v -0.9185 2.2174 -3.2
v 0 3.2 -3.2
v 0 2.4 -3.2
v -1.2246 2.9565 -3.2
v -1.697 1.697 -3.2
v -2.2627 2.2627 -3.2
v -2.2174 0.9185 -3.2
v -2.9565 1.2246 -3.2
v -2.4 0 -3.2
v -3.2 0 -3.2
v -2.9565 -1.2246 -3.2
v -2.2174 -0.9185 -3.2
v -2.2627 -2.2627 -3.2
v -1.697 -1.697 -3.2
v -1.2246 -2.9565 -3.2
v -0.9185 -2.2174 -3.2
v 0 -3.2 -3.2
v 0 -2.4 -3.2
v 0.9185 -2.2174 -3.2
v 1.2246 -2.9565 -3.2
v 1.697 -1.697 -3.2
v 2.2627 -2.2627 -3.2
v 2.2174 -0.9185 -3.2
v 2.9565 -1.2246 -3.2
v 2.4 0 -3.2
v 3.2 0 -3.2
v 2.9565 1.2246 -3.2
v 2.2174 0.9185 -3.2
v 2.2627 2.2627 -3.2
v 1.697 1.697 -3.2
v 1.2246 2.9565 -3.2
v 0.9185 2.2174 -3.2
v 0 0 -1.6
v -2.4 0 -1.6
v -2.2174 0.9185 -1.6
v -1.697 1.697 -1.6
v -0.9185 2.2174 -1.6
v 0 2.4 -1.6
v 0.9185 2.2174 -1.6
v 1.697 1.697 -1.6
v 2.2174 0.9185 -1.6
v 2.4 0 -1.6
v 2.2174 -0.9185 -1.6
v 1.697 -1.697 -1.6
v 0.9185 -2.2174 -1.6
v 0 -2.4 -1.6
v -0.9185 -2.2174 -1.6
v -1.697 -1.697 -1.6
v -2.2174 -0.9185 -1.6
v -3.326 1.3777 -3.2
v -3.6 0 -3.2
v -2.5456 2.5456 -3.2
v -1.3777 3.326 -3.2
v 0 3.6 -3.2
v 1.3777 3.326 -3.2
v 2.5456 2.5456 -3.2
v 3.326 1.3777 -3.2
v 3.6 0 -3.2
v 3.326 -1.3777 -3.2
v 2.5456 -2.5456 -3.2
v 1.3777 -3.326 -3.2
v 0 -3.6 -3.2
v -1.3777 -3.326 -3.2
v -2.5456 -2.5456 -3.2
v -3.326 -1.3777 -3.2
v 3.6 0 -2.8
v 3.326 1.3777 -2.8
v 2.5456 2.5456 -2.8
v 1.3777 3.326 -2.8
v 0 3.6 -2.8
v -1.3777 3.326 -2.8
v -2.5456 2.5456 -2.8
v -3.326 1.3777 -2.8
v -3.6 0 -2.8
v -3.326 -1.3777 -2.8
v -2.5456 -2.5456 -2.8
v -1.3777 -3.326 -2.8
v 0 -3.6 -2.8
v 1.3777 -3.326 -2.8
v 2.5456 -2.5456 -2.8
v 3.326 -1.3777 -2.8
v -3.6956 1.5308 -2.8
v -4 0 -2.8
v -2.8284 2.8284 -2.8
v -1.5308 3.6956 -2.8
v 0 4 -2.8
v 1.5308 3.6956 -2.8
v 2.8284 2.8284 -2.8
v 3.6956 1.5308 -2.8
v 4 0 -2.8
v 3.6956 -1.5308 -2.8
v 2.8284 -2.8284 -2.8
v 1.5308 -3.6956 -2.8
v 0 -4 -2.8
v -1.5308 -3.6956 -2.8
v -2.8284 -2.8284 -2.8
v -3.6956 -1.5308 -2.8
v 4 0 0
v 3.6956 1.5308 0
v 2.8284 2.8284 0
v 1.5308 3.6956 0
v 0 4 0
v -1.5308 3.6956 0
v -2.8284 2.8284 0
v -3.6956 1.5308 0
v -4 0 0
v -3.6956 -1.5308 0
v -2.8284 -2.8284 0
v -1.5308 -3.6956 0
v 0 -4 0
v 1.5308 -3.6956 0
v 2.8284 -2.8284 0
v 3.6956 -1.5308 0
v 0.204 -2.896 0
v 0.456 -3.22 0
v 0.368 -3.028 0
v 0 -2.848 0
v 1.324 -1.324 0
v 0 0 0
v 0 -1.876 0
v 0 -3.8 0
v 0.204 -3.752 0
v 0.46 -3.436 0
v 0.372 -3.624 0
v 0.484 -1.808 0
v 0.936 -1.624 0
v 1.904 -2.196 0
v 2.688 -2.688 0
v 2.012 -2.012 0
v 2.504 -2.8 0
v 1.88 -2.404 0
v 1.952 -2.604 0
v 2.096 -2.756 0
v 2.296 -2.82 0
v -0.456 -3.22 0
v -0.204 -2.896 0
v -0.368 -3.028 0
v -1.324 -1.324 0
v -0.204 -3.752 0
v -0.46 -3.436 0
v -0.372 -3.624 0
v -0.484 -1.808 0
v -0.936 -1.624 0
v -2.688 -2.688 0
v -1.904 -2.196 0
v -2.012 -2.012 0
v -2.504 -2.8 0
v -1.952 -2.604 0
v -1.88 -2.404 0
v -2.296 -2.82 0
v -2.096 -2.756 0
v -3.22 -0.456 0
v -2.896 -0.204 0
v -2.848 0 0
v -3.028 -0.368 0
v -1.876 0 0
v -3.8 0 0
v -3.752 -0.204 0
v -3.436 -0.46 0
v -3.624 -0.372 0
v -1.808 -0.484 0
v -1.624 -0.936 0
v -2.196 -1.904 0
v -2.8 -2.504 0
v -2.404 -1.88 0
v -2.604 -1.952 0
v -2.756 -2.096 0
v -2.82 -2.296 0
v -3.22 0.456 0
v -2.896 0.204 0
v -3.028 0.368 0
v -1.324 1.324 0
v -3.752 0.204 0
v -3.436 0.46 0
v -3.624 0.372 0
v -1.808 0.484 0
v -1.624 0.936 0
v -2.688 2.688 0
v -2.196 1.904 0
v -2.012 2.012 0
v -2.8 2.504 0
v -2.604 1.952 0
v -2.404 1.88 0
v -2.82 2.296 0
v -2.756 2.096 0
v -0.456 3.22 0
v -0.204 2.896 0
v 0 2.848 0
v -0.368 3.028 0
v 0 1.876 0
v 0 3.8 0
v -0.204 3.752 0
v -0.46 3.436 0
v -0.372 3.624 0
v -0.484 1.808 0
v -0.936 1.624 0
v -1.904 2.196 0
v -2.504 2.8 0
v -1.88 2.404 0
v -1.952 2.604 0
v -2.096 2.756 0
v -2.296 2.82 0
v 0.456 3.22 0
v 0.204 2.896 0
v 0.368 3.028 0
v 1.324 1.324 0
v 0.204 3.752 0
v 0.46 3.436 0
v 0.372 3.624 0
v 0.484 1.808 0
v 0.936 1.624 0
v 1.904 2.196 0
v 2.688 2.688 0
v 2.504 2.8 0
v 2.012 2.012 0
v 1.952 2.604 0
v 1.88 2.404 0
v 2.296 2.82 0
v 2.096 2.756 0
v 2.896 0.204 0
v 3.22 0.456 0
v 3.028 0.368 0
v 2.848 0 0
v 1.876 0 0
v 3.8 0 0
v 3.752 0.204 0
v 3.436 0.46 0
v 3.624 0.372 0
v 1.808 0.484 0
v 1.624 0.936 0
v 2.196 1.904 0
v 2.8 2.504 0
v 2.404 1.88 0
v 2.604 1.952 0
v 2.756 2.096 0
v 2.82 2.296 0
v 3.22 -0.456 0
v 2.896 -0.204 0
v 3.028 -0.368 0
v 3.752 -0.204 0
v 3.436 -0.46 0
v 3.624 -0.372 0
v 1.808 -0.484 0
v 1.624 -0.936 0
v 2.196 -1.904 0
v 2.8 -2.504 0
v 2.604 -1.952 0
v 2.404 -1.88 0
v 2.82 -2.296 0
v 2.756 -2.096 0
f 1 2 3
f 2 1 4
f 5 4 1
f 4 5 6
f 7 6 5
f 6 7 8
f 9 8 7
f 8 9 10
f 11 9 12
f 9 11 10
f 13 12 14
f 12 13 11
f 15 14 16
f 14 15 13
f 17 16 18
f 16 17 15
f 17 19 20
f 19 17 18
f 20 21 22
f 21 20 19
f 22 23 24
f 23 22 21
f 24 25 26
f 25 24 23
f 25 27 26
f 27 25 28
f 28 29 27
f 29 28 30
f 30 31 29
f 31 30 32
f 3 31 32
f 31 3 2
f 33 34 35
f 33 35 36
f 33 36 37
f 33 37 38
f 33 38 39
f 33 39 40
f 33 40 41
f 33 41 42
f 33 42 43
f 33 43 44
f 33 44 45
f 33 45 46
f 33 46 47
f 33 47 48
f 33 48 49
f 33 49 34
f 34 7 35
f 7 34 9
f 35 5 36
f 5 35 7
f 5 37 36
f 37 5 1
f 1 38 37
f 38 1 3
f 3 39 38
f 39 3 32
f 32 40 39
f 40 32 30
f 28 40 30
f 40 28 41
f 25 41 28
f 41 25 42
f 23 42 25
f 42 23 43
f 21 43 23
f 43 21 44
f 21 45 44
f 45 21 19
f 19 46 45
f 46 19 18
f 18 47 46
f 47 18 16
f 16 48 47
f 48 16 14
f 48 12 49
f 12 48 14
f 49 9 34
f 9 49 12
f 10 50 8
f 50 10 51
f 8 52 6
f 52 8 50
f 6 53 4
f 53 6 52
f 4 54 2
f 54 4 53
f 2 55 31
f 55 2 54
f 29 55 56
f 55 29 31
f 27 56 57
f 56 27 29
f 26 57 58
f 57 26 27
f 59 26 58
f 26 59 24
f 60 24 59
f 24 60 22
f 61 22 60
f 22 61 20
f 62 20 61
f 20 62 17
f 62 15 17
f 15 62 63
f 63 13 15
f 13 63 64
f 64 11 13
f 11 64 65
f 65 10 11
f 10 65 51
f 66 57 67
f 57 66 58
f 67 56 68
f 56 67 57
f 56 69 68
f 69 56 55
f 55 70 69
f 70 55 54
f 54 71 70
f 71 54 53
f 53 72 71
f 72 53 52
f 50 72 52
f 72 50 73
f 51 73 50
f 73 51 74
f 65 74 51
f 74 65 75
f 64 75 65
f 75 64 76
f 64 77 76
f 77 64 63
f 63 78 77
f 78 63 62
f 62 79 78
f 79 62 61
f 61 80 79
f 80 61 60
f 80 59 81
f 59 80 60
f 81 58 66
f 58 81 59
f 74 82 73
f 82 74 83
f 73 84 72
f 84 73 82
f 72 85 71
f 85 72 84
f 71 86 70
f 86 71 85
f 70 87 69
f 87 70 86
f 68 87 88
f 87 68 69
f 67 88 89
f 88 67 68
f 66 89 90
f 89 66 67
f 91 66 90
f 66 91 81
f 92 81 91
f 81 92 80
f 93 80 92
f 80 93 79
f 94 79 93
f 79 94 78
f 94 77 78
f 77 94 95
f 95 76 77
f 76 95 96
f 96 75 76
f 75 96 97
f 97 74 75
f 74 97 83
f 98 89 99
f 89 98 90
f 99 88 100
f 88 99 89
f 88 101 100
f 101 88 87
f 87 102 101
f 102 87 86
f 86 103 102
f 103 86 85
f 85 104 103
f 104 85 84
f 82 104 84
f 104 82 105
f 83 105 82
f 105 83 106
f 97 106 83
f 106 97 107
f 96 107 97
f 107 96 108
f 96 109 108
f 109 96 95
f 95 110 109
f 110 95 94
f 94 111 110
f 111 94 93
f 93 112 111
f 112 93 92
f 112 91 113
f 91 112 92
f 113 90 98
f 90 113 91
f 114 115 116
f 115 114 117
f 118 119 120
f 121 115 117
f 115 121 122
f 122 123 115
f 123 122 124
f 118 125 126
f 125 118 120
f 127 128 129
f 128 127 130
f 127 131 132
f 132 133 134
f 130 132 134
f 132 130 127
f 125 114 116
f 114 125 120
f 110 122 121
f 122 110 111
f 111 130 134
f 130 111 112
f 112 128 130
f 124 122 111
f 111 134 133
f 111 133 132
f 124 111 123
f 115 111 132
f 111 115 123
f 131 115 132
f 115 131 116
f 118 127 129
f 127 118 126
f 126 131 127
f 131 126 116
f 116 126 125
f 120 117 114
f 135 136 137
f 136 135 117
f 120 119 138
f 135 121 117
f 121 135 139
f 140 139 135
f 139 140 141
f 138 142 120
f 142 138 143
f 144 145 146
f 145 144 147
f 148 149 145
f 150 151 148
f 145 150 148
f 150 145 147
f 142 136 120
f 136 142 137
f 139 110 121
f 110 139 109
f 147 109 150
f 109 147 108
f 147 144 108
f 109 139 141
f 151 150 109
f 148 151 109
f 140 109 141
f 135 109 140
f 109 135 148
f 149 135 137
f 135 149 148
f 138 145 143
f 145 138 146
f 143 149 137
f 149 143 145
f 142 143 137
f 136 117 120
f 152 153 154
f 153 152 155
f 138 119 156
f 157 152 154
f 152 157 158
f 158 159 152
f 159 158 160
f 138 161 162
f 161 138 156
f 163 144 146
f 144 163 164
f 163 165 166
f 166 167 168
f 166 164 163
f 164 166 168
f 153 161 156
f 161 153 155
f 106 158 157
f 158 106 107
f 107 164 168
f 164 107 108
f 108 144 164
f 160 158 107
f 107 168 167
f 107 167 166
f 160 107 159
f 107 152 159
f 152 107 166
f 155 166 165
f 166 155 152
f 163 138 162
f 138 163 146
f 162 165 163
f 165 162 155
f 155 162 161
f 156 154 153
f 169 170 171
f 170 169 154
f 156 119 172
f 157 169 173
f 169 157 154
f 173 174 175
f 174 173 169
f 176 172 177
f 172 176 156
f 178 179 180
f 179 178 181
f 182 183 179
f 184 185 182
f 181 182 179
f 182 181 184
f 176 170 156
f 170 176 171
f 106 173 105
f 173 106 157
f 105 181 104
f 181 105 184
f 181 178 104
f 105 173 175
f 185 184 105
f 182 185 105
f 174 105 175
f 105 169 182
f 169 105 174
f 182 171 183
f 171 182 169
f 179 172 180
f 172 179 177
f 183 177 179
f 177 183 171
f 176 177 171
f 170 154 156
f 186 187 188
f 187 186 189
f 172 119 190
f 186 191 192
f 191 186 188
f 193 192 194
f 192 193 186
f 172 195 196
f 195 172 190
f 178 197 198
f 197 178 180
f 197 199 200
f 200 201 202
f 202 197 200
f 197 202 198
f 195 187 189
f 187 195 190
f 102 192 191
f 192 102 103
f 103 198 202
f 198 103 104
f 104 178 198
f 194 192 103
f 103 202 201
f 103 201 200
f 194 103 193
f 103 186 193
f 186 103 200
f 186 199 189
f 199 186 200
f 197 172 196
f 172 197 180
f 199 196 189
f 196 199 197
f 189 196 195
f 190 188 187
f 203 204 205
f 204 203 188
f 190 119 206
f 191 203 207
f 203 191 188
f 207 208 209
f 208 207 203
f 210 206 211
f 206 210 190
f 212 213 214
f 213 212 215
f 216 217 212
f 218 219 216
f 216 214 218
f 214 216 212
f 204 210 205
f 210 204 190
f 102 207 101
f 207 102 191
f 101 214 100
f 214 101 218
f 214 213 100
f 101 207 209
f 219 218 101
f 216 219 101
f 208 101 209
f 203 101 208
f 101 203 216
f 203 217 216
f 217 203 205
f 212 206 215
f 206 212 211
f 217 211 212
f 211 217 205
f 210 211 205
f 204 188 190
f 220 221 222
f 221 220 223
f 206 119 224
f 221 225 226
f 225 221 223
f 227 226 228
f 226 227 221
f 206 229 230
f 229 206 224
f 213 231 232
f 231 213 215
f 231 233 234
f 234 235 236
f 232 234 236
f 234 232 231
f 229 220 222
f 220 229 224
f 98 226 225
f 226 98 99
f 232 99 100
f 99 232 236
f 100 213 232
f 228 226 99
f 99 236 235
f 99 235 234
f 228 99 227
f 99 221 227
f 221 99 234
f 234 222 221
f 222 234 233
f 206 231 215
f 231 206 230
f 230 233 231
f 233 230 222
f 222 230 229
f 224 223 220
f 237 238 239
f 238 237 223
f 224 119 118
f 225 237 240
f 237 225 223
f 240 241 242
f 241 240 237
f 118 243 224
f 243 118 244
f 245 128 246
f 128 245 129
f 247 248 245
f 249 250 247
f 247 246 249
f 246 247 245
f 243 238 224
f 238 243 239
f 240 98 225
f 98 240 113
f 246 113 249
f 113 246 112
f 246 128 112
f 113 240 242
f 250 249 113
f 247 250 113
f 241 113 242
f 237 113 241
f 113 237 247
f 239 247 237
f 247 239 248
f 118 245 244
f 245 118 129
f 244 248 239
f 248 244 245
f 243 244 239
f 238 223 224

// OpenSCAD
// file: ../p/4-4disc.scad
use <../lib.scad>
function ldraw_lib__4_4disc() = [
// 0 Disc 1.0
// 0 Name: 4-4disc.dat
// 0 Author: James Jessiman
// 0 !LDRAW_ORG Primitive UPDATE 2002-02
// 0 !LICENSE Licensed under CC BY 4.0 : see CAreadme.txt
// 
// 0 BFC CERTIFY CCW
  [0,"BFC","CERTIFY"],
  [0,"BFC","CCW"],
// 
// 0 !HISTORY 1998-12-15 [PTadmin] Official Update 1998-10
// 0 !HISTORY 2002-03-23 [sbliss] Added BFC statement
// 0 !HISTORY 2002-04-25 [PTadmin] Official Update 2002-02
// 0 !HISTORY 2007-06-24 [PTadmin] Header formatted for Contributor Agreement
// 0 !HISTORY 2008-07-01 [PTadmin] Official Update 2008-01
// 
// 
// 3 16 0 0 0 1 0 0 0.9239 0 0.3827
  [3,16,0,0,0,1,0,0,0.9239,0,0.3827],
// 3 16 0 0 0 0.9239 0 0.3827 0.7071 0 0.7071
  [3,16,0,0,0,0.9239,0,0.3827,0.7071,0,0.7071],
// 3 16 0 0 0 0.7071 0 0.7071 0.3827 0 0.9239
  [3,16,0,0,0,0.7071,0,0.7071,0.3827,0,0.9239],
// 3 16 0 0 0 0.3827 0 0.9239 0 0 1
  [3,16,0,0,0,0.3827,0,0.9239,0,0,1],
// 3 16 0 0 0 0 0 1 -0.3827 0 0.9239
  [3,16,0,0,0,0,0,1,-0.3827,0,0.9239],
// 3 16 0 0 0 -0.3827 0 0.9239 -0.7071 0 0.7071
  [3,16,0,0,0,-0.3827,0,0.9239,-0.7071,0,0.7071],
// 3 16 0 0 0 -0.7071 0 0.7071 -0.9239 0 0.3827
  [3,16,0,0,0,-0.7071,0,0.7071,-0.9239,0,0.3827],
// 3 16 0 0 0 -0.9239 0 0.3827 -1 0 -0
  [3,16,0,0,0,-0.9239,0,0.3827,-1,0,-0],
// 3 16 0 0 0 -1 0 -0 -0.9239 0 -0.3827
  [3,16,0,0,0,-1,0,-0,-0.9239,0,-0.3827],
// 3 16 0 0 0 -0.9239 0 -0.3827 -0.7071 0 -0.7071
  [3,16,0,0,0,-0.9239,0,-0.3827,-0.7071,0,-0.7071],
// 3 16 0 0 0 -0.7071 0 -0.7071 -0.3827 0 -0.9239
  [3,16,0,0,0,-0.7071,0,-0.7071,-0.3827,0,-0.9239],
// 3 16 0 0 0 -0.3827 0 -0.9239 0 0 -1
  [3,16,0,0,0,-0.3827,0,-0.9239,0,0,-1],
// 3 16 0 0 0 0 0 -1 0.3827 0 -0.9239
  [3,16,0,0,0,0,0,-1,0.3827,0,-0.9239],
// 3 16 0 0 0 0.3827 0 -0.9239 0.7071 0 -0.7071
  [3,16,0,0,0,0.3827,0,-0.9239,0.7071,0,-0.7071],
// 3 16 0 0 0 0.7071 0 -0.7071 0.9239 0 -0.3827
  [3,16,0,0,0,0.7071,0,-0.7071,0.9239,0,-0.3827],
// 3 16 0 0 0 0.9239 0 -0.3827 1 0 0
  [3,16,0,0,0,0.9239,0,-0.3827,1,0,0],
// 0
];
module ldraw_lib__4_4disc(step=0, col=false, unit=2/5, alt=false, line=0.2, solid=!$preview)
    makepoly(ldraw_lib__4_4disc(), step=step, col=col, unit=unit, alt=alt, line=line, solid=solid);
ldraw_lib__4_4disc(line=0.2);
// file: ../p/4-4ring3.scad
use <../lib.scad>
function ldraw_lib__4_4ring3() = [
// 0 Ring  3 x 1.0
// 0 Name: 4-4ring3.dat
// 0 Author: James Jessiman
// 0 !LDRAW_ORG Primitive UPDATE 2009-01
// 0 !LICENSE Licensed under CC BY 4.0 : see CAreadme.txt
// 
// 0 BFC CERTIFY CCW
  [0,"BFC","CERTIFY"],
  [0,"BFC","CCW"],
// 
// 0 !HISTORY 1998-12-15 [PTadmin] Official Update 1998-10
// 0 !HISTORY 2002-04-05 [hafhead] Added BFC statement
// 0 !HISTORY 2002-04-25 [PTadmin] Official Update 2002-02
// 0 !HISTORY 2007-06-24 [PTadmin] Header formatted for Contributor Agreement
// 0 !HISTORY 2008-07-01 [PTadmin] Official Update 2008-01
// 0 !HISTORY 2008-08-26 [cwdee] Switch polygon winding and rename
// 0 !HISTORY 2009-05-02 [PTadmin] Official Update 2009-01
// 
// 
// 4 16 -1.5308 0 3.6956 -1.1481 0 2.7717 0 0 3 0 0 4
  [4,16,-1.5308,0,3.6956,-1.1481,0,2.7717,0,0,3,0,0,4],
// 4 16 -2.8284 0 2.8284 -2.1213 0 2.1213 -1.1481 0 2.7717 -1.5308 0 3.6956
  [4,16,-2.8284,0,2.8284,-2.1213,0,2.1213,-1.1481,0,2.7717,-1.5308,0,3.6956],
// 4 16 -3.6956 0 1.5308 -2.7717 0 1.1481 -2.1213 0 2.1213 -2.8284 0 2.8284
  [4,16,-3.6956,0,1.5308,-2.7717,0,1.1481,-2.1213,0,2.1213,-2.8284,0,2.8284],
// 4 16 -4 0 0 -3 0 0 -2.7717 0 1.1481 -3.6956 0 1.5308
  [4,16,-4,0,0,-3,0,0,-2.7717,0,1.1481,-3.6956,0,1.5308],
// 4 16 -3.6956 0 -1.5308 -2.7717 0 -1.1481 -3 0 0 -4 0 0
  [4,16,-3.6956,0,-1.5308,-2.7717,0,-1.1481,-3,0,0,-4,0,0],
// 4 16 -2.8284 0 -2.8284 -2.1213 0 -2.1213 -2.7717 0 -1.1481 -3.6956 0 -1.5308
  [4,16,-2.8284,0,-2.8284,-2.1213,0,-2.1213,-2.7717,0,-1.1481,-3.6956,0,-1.5308],
// 4 16 -1.5308 0 -3.6956 -1.1481 0 -2.7717 -2.1213 0 -2.1213 -2.8284 0 -2.8284
  [4,16,-1.5308,0,-3.6956,-1.1481,0,-2.7717,-2.1213,0,-2.1213,-2.8284,0,-2.8284],
// 4 16 0 0 -4 0 0 -3 -1.1481 0 -2.7717 -1.5308 0 -3.6956
  [4,16,0,0,-4,0,0,-3,-1.1481,0,-2.7717,-1.5308,0,-3.6956],
// 4 16 1.5308 0 -3.6956 1.1481 0 -2.7717 0 0 -3 0 0 -4
  [4,16,1.5308,0,-3.6956,1.1481,0,-2.7717,0,0,-3,0,0,-4],
// 4 16 2.8284 0 -2.8284 2.1213 0 -2.1213 1.1481 0 -2.7717 1.5308 0 -3.6956
  [4,16,2.8284,0,-2.8284,2.1213,0,-2.1213,1.1481,0,-2.7717,1.5308,0,-3.6956],
// 4 16 3.6956 0 -1.5308 2.7717 0 -1.1481 2.1213 0 -2.1213 2.8284 0 -2.8284
  [4,16,3.6956,0,-1.5308,2.7717,0,-1.1481,2.1213,0,-2.1213,2.8284,0,-2.8284],
// 4 16 4 0 0 3 0 0 2.7717 0 -1.1481 3.6956 0 -1.5308
  [4,16,4,0,0,3,0,0,2.7717,0,-1.1481,3.6956,0,-1.5308],
// 4 16 3.6956 0 1.5308 2.7717 0 1.1481 3 0 0 4 0 0
  [4,16,3.6956,0,1.5308,2.7717,0,1.1481,3,0,0,4,0,0],
// 4 16 2.8284 0 2.8284 2.1213 0 2.1213 2.7717 0 1.1481 3.6956 0 1.5308
  [4,16,2.8284,0,2.8284,2.1213,0,2.1213,2.7717,0,1.1481,3.6956,0,1.5308],
// 4 16 1.5308 0 3.6956 1.1481 0 2.7717 2.1213 0 2.1213 2.8284 0 2.8284
  [4,16,1.5308,0,3.6956,1.1481,0,2.7717,2.1213,0,2.1213,2.8284,0,2.8284],
// 4 16 0 0 4 0 0 3 1.1481 0 2.7717 1.5308 0 3.6956
  [4,16,0,0,4,0,0,3,1.1481,0,2.7717,1.5308,0,3.6956],
// 0
];
module ldraw_lib__4_4ring3(step=0, col=false, unit=2/5, alt=false, line=0.2, solid=!$preview)
    makepoly(ldraw_lib__4_4ring3(), step=step, col=col, unit=unit, alt=alt, line=line, solid=solid);
ldraw_lib__4_4ring3(line=0.2);
// file: ../p/4-4cylc.scad
use <../lib.scad>
use <4-4cyli.scad>
use <4-4disc.scad>
use <4-4edge.scad>
function ldraw_lib__4_4cylc() = [
// 0 Cylinder Closed 1.0
// 0 Name: 4-4cylc.dat
// 0 Author: Alex Taylor [anathema]
// 0 !LDRAW_ORG Primitive UPDATE 2009-02
// 0 !LICENSE Licensed under CC BY 4.0 : see CAreadme.txt
// 
// 0 BFC CERTIFY CCW
  [0,"BFC","CERTIFY"],
  [0,"BFC","CCW"],
// 
// 0 !HISTORY 2008-12-29 [cwdee] Removed one disc
// 0 !HISTORY 2009-09-03 [PTadmin] Official Update 2009-02
// 
// 
// 1 16 0 0 0 1 0 0 0 1 0 0 0 1 4-4edge.dat
  [1,16,0,0,0,1,0,0,0,1,0,0,0,1, ldraw_lib__4_4edge()],
// 1 16 0 1 0 1 0 0 0 1 0 0 0 1 4-4edge.dat
  [1,16,0,1,0,1,0,0,0,1,0,0,0,1, ldraw_lib__4_4edge()],
// 1 16 0 0 0 1 0 0 0 1 0 0 0 1 4-4disc.dat
  [1,16,0,0,0,1,0,0,0,1,0,0,0,1, ldraw_lib__4_4disc()],
// 1 16 0 0 0 1 0 0 0 1 0 0 0 1 4-4cyli.dat
  [1,16,0,0,0,1,0,0,0,1,0,0,0,1, ldraw_lib__4_4cyli()],
// 0
];
module ldraw_lib__4_4cylc(step=0, col=false, unit=2/5, alt=false, line=0.2, solid=!$preview)
    makepoly(ldraw_lib__4_4cylc(), step=step, col=col, unit=unit, alt=alt, line=line, solid=solid);
ldraw_lib__4_4cylc(line=0.2);
// file: ../p/4-4edge.scad
use <../lib.scad>
function ldraw_lib__4_4edge() = [
// 0 Circle 1.0
// 0 Name: 4-4edge.dat
// 0 Author: James Jessiman
// 0 !LDRAW_ORG Primitive UPDATE 2017-01
// 0 !LICENSE Licensed under CC BY 4.0 : see CAreadme.txt
// 
// 0 BFC CERTIFY CCW
  [0,"BFC","CERTIFY"],
  [0,"BFC","CCW"],
// 
// 0 !HISTORY 1998-12-15 [PTadmin] Official Update 1998-10
// 0 !HISTORY 2005-12-28 [PTadmin] Official Update 2005-01
// 0 !HISTORY 2007-06-24 [PTadmin] Header formatted for Contributor Agreement
// 0 !HISTORY 2008-07-01 [PTadmin] Official Update 2008-01
// 0 !HISTORY 2017-01-15 [Steffen] BFCed
// 0 !HISTORY 2017-12-30 [PTadmin] Official Update 2017-01
// 
// 
// 2 24 1 0 0 0.9239 0 0.3827
  [2,24,1,0,0,0.9239,0,0.3827],
// 2 24 0.9239 0 0.3827 0.7071 0 0.7071
  [2,24,0.9239,0,0.3827,0.7071,0,0.7071],
// 2 24 0.7071 0 0.7071 0.3827 0 0.9239
  [2,24,0.7071,0,0.7071,0.3827,0,0.9239],
// 2 24 0.3827 0 0.9239 0 0 1
  [2,24,0.3827,0,0.9239,0,0,1],
// 2 24 0 0 1 -0.3827 0 0.9239
  [2,24,0,0,1,-0.3827,0,0.9239],
// 2 24 -0.3827 0 0.9239 -0.7071 0 0.7071
  [2,24,-0.3827,0,0.9239,-0.7071,0,0.7071],
// 2 24 -0.7071 0 0.7071 -0.9239 0 0.3827
  [2,24,-0.7071,0,0.7071,-0.9239,0,0.3827],
// 2 24 -0.9239 0 0.3827 -1 0 -0
  [2,24,-0.9239,0,0.3827,-1,0,-0],
// 2 24 -1 0 -0 -0.9239 0 -0.3827
  [2,24,-1,0,-0,-0.9239,0,-0.3827],
// 2 24 -0.9239 0 -0.3827 -0.7071 0 -0.7071
  [2,24,-0.9239,0,-0.3827,-0.7071,0,-0.7071],
// 2 24 -0.7071 0 -0.7071 -0.3827 0 -0.9239
  [2,24,-0.7071,0,-0.7071,-0.3827,0,-0.9239],
// 2 24 -0.3827 0 -0.9239 0 0 -1
  [2,24,-0.3827,0,-0.9239,0,0,-1],
// 2 24 0 0 -1 0.3827 0 -0.9239
  [2,24,0,0,-1,0.3827,0,-0.9239],
// 2 24 0.3827 0 -0.9239 0.7071 0 -0.7071
  [2,24,0.3827,0,-0.9239,0.7071,0,-0.7071],
// 2 24 0.7071 0 -0.7071 0.9239 0 -0.3827
  [2,24,0.7071,0,-0.7071,0.9239,0,-0.3827],
// 2 24 0.9239 0 -0.3827 1 0 0
  [2,24,0.9239,0,-0.3827,1,0,0],
];
module ldraw_lib__4_4edge(step=0, col=false, unit=2/5, alt=false, line=0.2, solid=!$preview)
    makepoly(ldraw_lib__4_4edge(), step=step, col=col, unit=unit, alt=alt, line=line, solid=solid);
ldraw_lib__4_4edge(line=0.2);
// file: ../p/4-4cyli.scad
use <../lib.scad>
function ldraw_lib__4_4cyli() = [
// 0 Cylinder 1.0
// 0 Name: 4-4cyli.dat
// 0 Author: James Jessiman
// 0 !LDRAW_ORG Primitive UPDATE 2005-01
// 0 !LICENSE Licensed under CC BY 4.0 : see CAreadme.txt
// 
// 0 BFC CERTIFY CCW
  [0,"BFC","CERTIFY"],
  [0,"BFC","CCW"],
// 
// 0 !HISTORY 1998-12-15 [PTadmin] Official Update 1998-10
// 0 !HISTORY 2002-03-23 [sbliss] Added BFC statement; merged headers from files in distributions LDraw 0.27 and Complete.
// 0 !HISTORY 2002-04-25 [PTadmin] Official Update 2002-02
// 0 !HISTORY 2004-12-14 [guyvivan] BFC CCW
// 0 !HISTORY 2005-12-28 [PTadmin] Official Update 2005-01
// 0 !HISTORY 2007-06-24 [PTadmin] Header formatted for Contributor Agreement
// 0 !HISTORY 2008-07-01 [PTadmin] Official Update 2008-01
// 
// 
// 4 16 1 1 0 0.9239 1 0.3827 0.9239 0 0.3827 1 0 0
  [4,16,1,1,0,0.9239,1,0.3827,0.9239,0,0.3827,1,0,0],
// 5 24 1 0 0 1 1 0 0.9239 0 0.3827 0.9239 0 -0.3827
  [5,24,1,0,0,1,1,0,0.9239,0,0.3827,0.9239,0,-0.3827],
// 4 16 0.9239 1 0.3827 0.7071 1 0.7071 0.7071 0 0.7071 0.9239 0 0.3827
  [4,16,0.9239,1,0.3827,0.7071,1,0.7071,0.7071,0,0.7071,0.9239,0,0.3827],
// 5 24 0.9239 0 0.3827 0.9239 1 0.3827 0.7071 0 0.7071 1 0 0
  [5,24,0.9239,0,0.3827,0.9239,1,0.3827,0.7071,0,0.7071,1,0,0],
// 4 16 0.7071 1 0.7071 0.3827 1 0.9239 0.3827 0 0.9239 0.7071 0 0.7071
  [4,16,0.7071,1,0.7071,0.3827,1,0.9239,0.3827,0,0.9239,0.7071,0,0.7071],
// 5 24 0.7071 0 0.7071 0.7071 1 0.7071 0.3827 0 0.9239 0.9239 0 0.3827
  [5,24,0.7071,0,0.7071,0.7071,1,0.7071,0.3827,0,0.9239,0.9239,0,0.3827],
// 4 16 0.3827 1 0.9239 0 1 1 0 0 1 0.3827 0 0.9239
  [4,16,0.3827,1,0.9239,0,1,1,0,0,1,0.3827,0,0.9239],
// 5 24 0.3827 0 0.9239 0.3827 1 0.9239 0 0 1 0.7071 0 0.7071
  [5,24,0.3827,0,0.9239,0.3827,1,0.9239,0,0,1,0.7071,0,0.7071],
// 4 16 0 1 1 -0.3827 1 0.9239 -0.3827 0 0.9239 0 0 1
  [4,16,0,1,1,-0.3827,1,0.9239,-0.3827,0,0.9239,0,0,1],
// 5 24 0 0 1 0 1 1 -0.3827 0 0.9239 0.3827 0 0.9239
  [5,24,0,0,1,0,1,1,-0.3827,0,0.9239,0.3827,0,0.9239],
// 4 16 -0.3827 1 0.9239 -0.7071 1 0.7071 -0.7071 0 0.7071 -0.3827 0 0.9239
  [4,16,-0.3827,1,0.9239,-0.7071,1,0.7071,-0.7071,0,0.7071,-0.3827,0,0.9239],
// 5 24 -0.3827 0 0.9239 -0.3827 1 0.9239 -0.7071 0 0.7071 0 0 1
  [5,24,-0.3827,0,0.9239,-0.3827,1,0.9239,-0.7071,0,0.7071,0,0,1],
// 4 16 -0.7071 1 0.7071 -0.9239 1 0.3827 -0.9239 0 0.3827 -0.7071 0 0.7071
  [4,16,-0.7071,1,0.7071,-0.9239,1,0.3827,-0.9239,0,0.3827,-0.7071,0,0.7071],
// 5 24 -0.7071 0 0.7071 -0.7071 1 0.7071 -0.9239 0 0.3827 -0.3827 0 0.9239
  [5,24,-0.7071,0,0.7071,-0.7071,1,0.7071,-0.9239,0,0.3827,-0.3827,0,0.9239],
// 4 16 -0.9239 1 0.3827 -1 1 0 -1 0 0 -0.9239 0 0.3827
  [4,16,-0.9239,1,0.3827,-1,1,0,-1,0,0,-0.9239,0,0.3827],
// 5 24 -0.9239 0 0.3827 -0.9239 1 0.3827 -1 0 0 -0.7071 0 0.7071
  [5,24,-0.9239,0,0.3827,-0.9239,1,0.3827,-1,0,0,-0.7071,0,0.7071],
// 4 16 -1 1 0 -0.9239 1 -0.3827 -0.9239 0 -0.3827 -1 0 0
  [4,16,-1,1,0,-0.9239,1,-0.3827,-0.9239,0,-0.3827,-1,0,0],
// 5 24 -1 0 0 -1 1 0 -0.9239 0 -0.3827 -0.9239 0 0.3827
  [5,24,-1,0,0,-1,1,0,-0.9239,0,-0.3827,-0.9239,0,0.3827],
// 4 16 -0.9239 1 -0.3827 -0.7071 1 -0.7071 -0.7071 0 -0.7071 -0.9239 0 -0.3827
  [4,16,-0.9239,1,-0.3827,-0.7071,1,-0.7071,-0.7071,0,-0.7071,-0.9239,0,-0.3827],
// 5 24 -0.9239 0 -0.3827 -0.9239 1 -0.3827 -0.7071 0 -0.7071 -1 0 0
  [5,24,-0.9239,0,-0.3827,-0.9239,1,-0.3827,-0.7071,0,-0.7071,-1,0,0],
// 4 16 -0.7071 1 -0.7071 -0.3827 1 -0.9239 -0.3827 0 -0.9239 -0.7071 0 -0.7071
  [4,16,-0.7071,1,-0.7071,-0.3827,1,-0.9239,-0.3827,0,-0.9239,-0.7071,0,-0.7071],
// 5 24 -0.7071 0 -0.7071 -0.7071 1 -0.7071 -0.3827 0 -0.9239 -0.9239 0 -0.3827
  [5,24,-0.7071,0,-0.7071,-0.7071,1,-0.7071,-0.3827,0,-0.9239,-0.9239,0,-0.3827],
// 4 16 -0.3827 1 -0.9239 0 1 -1 0 0 -1 -0.3827 0 -0.9239
  [4,16,-0.3827,1,-0.9239,0,1,-1,0,0,-1,-0.3827,0,-0.9239],
// 5 24 -0.3827 0 -0.9239 -0.3827 1 -0.9239 0 0 -1 -0.7071 0 -0.7071
  [5,24,-0.3827,0,-0.9239,-0.3827,1,-0.9239,0,0,-1,-0.7071,0,-0.7071],
// 4 16 0 1 -1 0.3827 1 -0.9239 0.3827 0 -0.9239 0 0 -1
  [4,16,0,1,-1,0.3827,1,-0.9239,0.3827,0,-0.9239,0,0,-1],
// 5 24 0 0 -1 0 1 -1 0.3827 0 -0.9239 -0.3827 0 -0.9239
  [5,24,0,0,-1,0,1,-1,0.3827,0,-0.9239,-0.3827,0,-0.9239],
// 4 16 0.3827 1 -0.9239 0.7071 1 -0.7071 0.7071 0 -0.7071 0.3827 0 -0.9239
  [4,16,0.3827,1,-0.9239,0.7071,1,-0.7071,0.7071,0,-0.7071,0.3827,0,-0.9239],
// 5 24 0.3827 0 -0.9239 0.3827 1 -0.9239 0.7071 0 -0.7071 0 0 -1
  [5,24,0.3827,0,-0.9239,0.3827,1,-0.9239,0.7071,0,-0.7071,0,0,-1],
// 4 16 0.7071 1 -0.7071 0.9239 1 -0.3827 0.9239 0 -0.3827 0.7071 0 -0.7071
  [4,16,0.7071,1,-0.7071,0.9239,1,-0.3827,0.9239,0,-0.3827,0.7071,0,-0.7071],
// 5 24 0.7071 0 -0.7071 0.7071 1 -0.7071 0.9239 0 -0.3827 0.3827 0 -0.9239
  [5,24,0.7071,0,-0.7071,0.7071,1,-0.7071,0.9239,0,-0.3827,0.3827,0,-0.9239],
// 4 16 0.9239 1 -0.3827 1 1 0 1 0 0 0.9239 0 -0.3827
  [4,16,0.9239,1,-0.3827,1,1,0,1,0,0,0.9239,0,-0.3827],
// 5 24 0.9239 0 -0.3827 0.9239 1 -0.3827 1 0 0 0.7071 0 -0.7071
  [5,24,0.9239,0,-0.3827,0.9239,1,-0.3827,1,0,0,0.7071,0,-0.7071],
// 0
];
module ldraw_lib__4_4cyli(step=0, col=false, unit=2/5, alt=false, line=0.2, solid=!$preview)
    makepoly(ldraw_lib__4_4cyli(), step=step, col=col, unit=unit, alt=alt, line=line, solid=solid);
ldraw_lib__4_4cyli(line=0.2);
// file: ../p/empty.scad
use <../lib.scad>
function ldraw_lib__empty() = [
// 0 Empty
// 0 Name: empty.dat
// 0 Author: Steffen [Steffen]
// 0 !LDRAW_ORG Primitive UPDATE 2025-08
// 0 !LICENSE Licensed under CC BY 4.0 : see CAreadme.txt
// 
// 0 BFC CERTIFY CCW
  [0,"BFC","CERTIFY"],
  [0,"BFC","CCW"],
// 
// 0 !HISTORY 2015-10-11 [PTadmin] Official Update 2015-01
// 0 !HISTORY 2025-08-13 [OrionP] Fix comments
// 0 !HISTORY 2025-08-31 [OrionP] Official Update 2025-08
// 
// 0 // Tool MLCad cannot handle really empty files. This file is used as a workaround.
// 0 // It exceptionally contains forbidden non-LDRAW standard syntax to satisfy MLCad
// 0 // until it is fixed OR a different editor has become the de-facto LDRAW standard.
// 0 // The line being used here is an "impossible" conditional line which never should be visible,
// 0 // additionally hidden by a syntax explicitly hiding it from displaying.
// 
// 0 MLCAD HIDE 5 24 0 0 0 0.0001 0 0 0.0001 -0.0001 0 0 0 0
];
module ldraw_lib__empty(step=0, col=false, unit=2/5, alt=false, line=0.2, solid=!$preview)
    makepoly(ldraw_lib__empty(), step=step, col=col, unit=unit, alt=alt, line=line, solid=solid);
ldraw_lib__empty(line=0.2);
// file: ../p/stud4o.scad
use <../lib.scad>
use <4-4cylc.scad>
use <4-4ring3.scad>
function ldraw_lib__stud4o() = [
// 0 Stud Tube Open without Outer Cylinder
// 0 Name: stud4o.dat
// 0 Author: Magnus Forsberg [MagFors]
// 0 !LDRAW_ORG Primitive UPDATE 2011-02
// 0 !LICENSE Licensed under CC BY 4.0 : see CAreadme.txt
// 
// 0 !HELP This stud is a "antistud" to be used like a underside stud,
// 0 !HELP but without the outer cylinder.
// 0 !HELP 1 47 0 0 0 1 0 0 0 1 0 0 0 1 stud4.dat
// 
// 0 BFC CERTIFY CCW
  [0,"BFC","CERTIFY"],
  [0,"BFC","CCW"],
// 
// 0 !HISTORY 2011-12-29 [PTadmin] Official Update 2011-02
// 
// 
// 1 16 0 -4 0 2 0 0 0 1 0 0 0 2 4-4ring3.dat
  [1,16,0,-4,0,2,0,0,0,1,0,0,0,2, ldraw_lib__4_4ring3()],
// 0 BFC INVERTNEXT
  [0,"BFC","INVERTNEXT"],
// 1 16 0 0 0 -6 0 0 0 -4 0 0 0 6 4-4cylc.dat
  [1,16,0,0,0,-6,0,0,0,-4,0,0,0,6, ldraw_lib__4_4cylc()],
];
module ldraw_lib__stud4o(step=0, col=false, unit=2/5, alt=false, line=0.2, solid=!$preview)
    makepoly(ldraw_lib__stud4o(), step=step, col=col, unit=unit, alt=alt, line=line, solid=solid);
ldraw_lib__stud4o(line=0.2);
// file: ../p/4-4ring9.scad
use <../lib.scad>
function ldraw_lib__4_4ring9() = [
// 0 Ring  9 x 1.0
// 0 Name: 4-4ring9.dat
// 0 Author: Magnus Forsberg [MagFors]
// 0 !LDRAW_ORG Primitive UPDATE 2024-01
// 0 !LICENSE Licensed under CC BY 4.0 : see CAreadme.txt
// 
// 0 BFC CERTIFY CCW
  [0,"BFC","CERTIFY"],
  [0,"BFC","CCW"],
// 
// 0 !HISTORY 2004-04-22 [PTadmin] Official Update 2004-02
// 0 !HISTORY 2007-06-24 [PTadmin] Header formatted for Contributor Agreement
// 0 !HISTORY 2008-07-01 [PTadmin] Official Update 2008-01
// 0 !HISTORY 2024-01-04 [MagFors] Complete regeneration, original by jriley
// 0 !HISTORY 2024-01-29 [OrionP] Official Update 2024-01
// 
// 4 16 10 0 0 9.239 0 3.827 8.3151 0 3.4443 9 0 0
  [4,16,10,0,0,9.239,0,3.827,8.3151,0,3.4443,9,0,0],
// 4 16 9.239 0 3.827 7.071 0 7.071 6.3639 0 6.3639 8.3151 0 3.4443
  [4,16,9.239,0,3.827,7.071,0,7.071,6.3639,0,6.3639,8.3151,0,3.4443],
// 4 16 7.071 0 7.071 3.827 0 9.239 3.4443 0 8.3151 6.3639 0 6.3639
  [4,16,7.071,0,7.071,3.827,0,9.239,3.4443,0,8.3151,6.3639,0,6.3639],
// 4 16 3.827 0 9.239 0 0 10 0 0 9 3.4443 0 8.3151
  [4,16,3.827,0,9.239,0,0,10,0,0,9,3.4443,0,8.3151],
// 4 16 0 0 10 -3.827 0 9.239 -3.4443 0 8.3151 0 0 9
  [4,16,0,0,10,-3.827,0,9.239,-3.4443,0,8.3151,0,0,9],
// 4 16 -3.827 0 9.239 -7.071 0 7.071 -6.3639 0 6.3639 -3.4443 0 8.3151
  [4,16,-3.827,0,9.239,-7.071,0,7.071,-6.3639,0,6.3639,-3.4443,0,8.3151],
// 4 16 -7.071 0 7.071 -9.239 0 3.827 -8.3151 0 3.4443 -6.3639 0 6.3639
  [4,16,-7.071,0,7.071,-9.239,0,3.827,-8.3151,0,3.4443,-6.3639,0,6.3639],
// 4 16 -9.239 0 3.827 -10 0 0 -9 0 0 -8.3151 0 3.4443
  [4,16,-9.239,0,3.827,-10,0,0,-9,0,0,-8.3151,0,3.4443],
// 4 16 -10 0 0 -9.239 0 -3.827 -8.3151 0 -3.4443 -9 0 0
  [4,16,-10,0,0,-9.239,0,-3.827,-8.3151,0,-3.4443,-9,0,0],
// 4 16 -9.239 0 -3.827 -7.071 0 -7.071 -6.3639 0 -6.3639 -8.3151 0 -3.4443
  [4,16,-9.239,0,-3.827,-7.071,0,-7.071,-6.3639,0,-6.3639,-8.3151,0,-3.4443],
// 4 16 -7.071 0 -7.071 -3.827 0 -9.239 -3.4443 0 -8.3151 -6.3639 0 -6.3639
  [4,16,-7.071,0,-7.071,-3.827,0,-9.239,-3.4443,0,-8.3151,-6.3639,0,-6.3639],
// 4 16 -3.827 0 -9.239 0 0 -10 0 0 -9 -3.4443 0 -8.3151
  [4,16,-3.827,0,-9.239,0,0,-10,0,0,-9,-3.4443,0,-8.3151],
// 4 16 0 0 -10 3.827 0 -9.239 3.4443 0 -8.3151 0 0 -9
  [4,16,0,0,-10,3.827,0,-9.239,3.4443,0,-8.3151,0,0,-9],
// 4 16 3.827 0 -9.239 7.071 0 -7.071 6.3639 0 -6.3639 3.4443 0 -8.3151
  [4,16,3.827,0,-9.239,7.071,0,-7.071,6.3639,0,-6.3639,3.4443,0,-8.3151],
// 4 16 7.071 0 -7.071 9.239 0 -3.827 8.3151 0 -3.4443 6.3639 0 -6.3639
  [4,16,7.071,0,-7.071,9.239,0,-3.827,8.3151,0,-3.4443,6.3639,0,-6.3639],
// 4 16 9.239 0 -3.827 10 0 0 9 0 0 8.3151 0 -3.4443
  [4,16,9.239,0,-3.827,10,0,0,9,0,0,8.3151,0,-3.4443],
// 0 // Build by LDPartEditor (PrimGen 2.X)
];
module ldraw_lib__4_4ring9(step=0, col=false, unit=2/5, alt=false, line=0.2, solid=!$preview)
    makepoly(ldraw_lib__4_4ring9(), step=step, col=col, unit=unit, alt=alt, line=line, solid=solid);
ldraw_lib__4_4ring9(line=0.2);
// file: ../p/4-4ring8.scad
use <../lib.scad>
function ldraw_lib__4_4ring8() = [
// 0 Ring  8 x 1.0
// 0 Name: 4-4ring8.dat
// 0 Author: Steffen [Steffen]
// 0 !LDRAW_ORG Primitive UPDATE 2012-01
// 0 !LICENSE Licensed under CC BY 4.0 : see CAreadme.txt
// 
// 0 BFC CERTIFY CCW
  [0,"BFC","CERTIFY"],
  [0,"BFC","CCW"],
// 
// 0 !HISTORY 2003-12-19 [PTadmin] Official Update 2003-03
// 0 !HISTORY 2007-06-24 [PTadmin] Header formatted for Contributor Agreement
// 0 !HISTORY 2008-07-01 [PTadmin] Official Update 2008-01
// 0 !HISTORY 2012-02-16 [Philo] Changed to CCW
// 0 !HISTORY 2012-03-30 [PTadmin] Official Update 2012-01
// 
// 
// 4 16 9 0 0 8.3151 0 3.4443 7.3912 0 3.0616 8 0 0
  [4,16,9,0,0,8.3151,0,3.4443,7.3912,0,3.0616,8,0,0],
// 4 16 8.3151 0 3.4443 6.3639 0 6.3639 5.6568 0 5.6568 7.3912 0 3.0616
  [4,16,8.3151,0,3.4443,6.3639,0,6.3639,5.6568,0,5.6568,7.3912,0,3.0616],
// 4 16 6.3639 0 6.3639 3.4443 0 8.3151 3.0616 0 7.3912 5.6568 0 5.6568
  [4,16,6.3639,0,6.3639,3.4443,0,8.3151,3.0616,0,7.3912,5.6568,0,5.6568],
// 4 16 3.4443 0 8.3151 0 0 9 0 0 8 3.0616 0 7.3912
  [4,16,3.4443,0,8.3151,0,0,9,0,0,8,3.0616,0,7.3912],
// 4 16 0 0 9 -3.4443 0 8.3151 -3.0616 0 7.3912 0 0 8
  [4,16,0,0,9,-3.4443,0,8.3151,-3.0616,0,7.3912,0,0,8],
// 4 16 -3.4443 0 8.3151 -6.3639 0 6.3639 -5.6568 0 5.6568 -3.0616 0 7.3912
  [4,16,-3.4443,0,8.3151,-6.3639,0,6.3639,-5.6568,0,5.6568,-3.0616,0,7.3912],
// 4 16 -6.3639 0 6.3639 -8.3151 0 3.4443 -7.3912 0 3.0616 -5.6568 0 5.6568
  [4,16,-6.3639,0,6.3639,-8.3151,0,3.4443,-7.3912,0,3.0616,-5.6568,0,5.6568],
// 4 16 -8.3151 0 3.4443 -9 0 0 -8 0 0 -7.3912 0 3.0616
  [4,16,-8.3151,0,3.4443,-9,0,0,-8,0,0,-7.3912,0,3.0616],
// 4 16 -9 0 0 -8.3151 0 -3.4443 -7.3912 0 -3.0616 -8 0 0
  [4,16,-9,0,0,-8.3151,0,-3.4443,-7.3912,0,-3.0616,-8,0,0],
// 4 16 -8.3151 0 -3.4443 -6.3639 0 -6.3639 -5.6568 0 -5.6568 -7.3912 0 -3.0616
  [4,16,-8.3151,0,-3.4443,-6.3639,0,-6.3639,-5.6568,0,-5.6568,-7.3912,0,-3.0616],
// 4 16 -6.3639 0 -6.3639 -3.4443 0 -8.3151 -3.0616 0 -7.3912 -5.6568 0 -5.6568
  [4,16,-6.3639,0,-6.3639,-3.4443,0,-8.3151,-3.0616,0,-7.3912,-5.6568,0,-5.6568],
// 4 16 -3.4443 0 -8.3151 0 0 -9 0 0 -8 -3.0616 0 -7.3912
  [4,16,-3.4443,0,-8.3151,0,0,-9,0,0,-8,-3.0616,0,-7.3912],
// 4 16 0 0 -9 3.4443 0 -8.3151 3.0616 0 -7.3912 0 0 -8
  [4,16,0,0,-9,3.4443,0,-8.3151,3.0616,0,-7.3912,0,0,-8],
// 4 16 3.4443 0 -8.3151 6.3639 0 -6.3639 5.6568 0 -5.6568 3.0616 0 -7.3912
  [4,16,3.4443,0,-8.3151,6.3639,0,-6.3639,5.6568,0,-5.6568,3.0616,0,-7.3912],
// 4 16 6.3639 0 -6.3639 8.3151 0 -3.4443 7.3912 0 -3.0616 5.6568 0 -5.6568
  [4,16,6.3639,0,-6.3639,8.3151,0,-3.4443,7.3912,0,-3.0616,5.6568,0,-5.6568],
// 4 16 8.3151 0 -3.4443 9 0 0 8 0 0 7.3912 0 -3.0616
  [4,16,8.3151,0,-3.4443,9,0,0,8,0,0,7.3912,0,-3.0616],
];
module ldraw_lib__4_4ring8(step=0, col=false, unit=2/5, alt=false, line=0.2, solid=!$preview)
    makepoly(ldraw_lib__4_4ring8(), step=step, col=col, unit=unit, alt=alt, line=line, solid=solid);
ldraw_lib__4_4ring8(line=0.2);
// file: ../p/4-4cylo.scad
use <../lib.scad>
use <4-4cyli.scad>
use <4-4edge.scad>
function ldraw_lib__4_4cylo() = [
// 0 Cylinder Open 1.0
// 0 Name: 4-4cylo.dat
// 0 Author: Mark Kennedy [mkennedy]
// 0 !LDRAW_ORG Primitive UPDATE 2010-01
// 0 !LICENSE Licensed under CC BY 4.0 : see CAreadme.txt
// 
// 0 BFC CERTIFY CCW
  [0,"BFC","CERTIFY"],
  [0,"BFC","CCW"],
// 
// 0 !HISTORY 2010-04-05 [PTadmin] Official Update 2010-01
// 
// 
// 1 16 0 0 0 1 0 0 0 1 0 0 0 1 4-4edge.dat
  [1,16,0,0,0,1,0,0,0,1,0,0,0,1, ldraw_lib__4_4edge()],
// 1 16 0 1 0 1 0 0 0 1 0 0 0 1 4-4edge.dat
  [1,16,0,1,0,1,0,0,0,1,0,0,0,1, ldraw_lib__4_4edge()],
// 1 16 0 0 0 1 0 0 0 1 0 0 0 1 4-4cyli.dat
  [1,16,0,0,0,1,0,0,0,1,0,0,0,1, ldraw_lib__4_4cyli()],
// 0
];
module ldraw_lib__4_4cylo(step=0, col=false, unit=2/5, alt=false, line=0.2, solid=!$preview)
    makepoly(ldraw_lib__4_4cylo(), step=step, col=col, unit=unit, alt=alt, line=line, solid=solid);
ldraw_lib__4_4cylo(line=0.2);
// file: ../p/1-16chrd.scad
use <../lib.scad>
use <empty.scad>
function ldraw_lib__1_16chrd() = [
// 0 Chord 0.0625
// 0 Name: 1-16chrd.dat
// 0 Author: Philippe Hurbain [Philo]
// 0 !LDRAW_ORG Primitive UPDATE 2015-01
// 0 !LICENSE Licensed under CC BY 4.0 : see CAreadme.txt
// 
// 0 BFC CERTIFY CCW
  [0,"BFC","CERTIFY"],
  [0,"BFC","CCW"],
// 
// 0 !HISTORY 2015-10-11 [PTadmin] Official Update 2015-01
// 
// 
// 0 // This file is intentionally empty because at the current \P resolution,
// 0 // an 1-16chrd is actually empty. However, this file still is present
// 0 // to allow tools to do primitives substition and fill in a real chrd here,
// 0 // or, if desired, to substitute this with the hi-res 48\1-16chrd.
// 
// 0 // This file is based on an idea by Darats at http://forums.ldraw.org/read.php?19,14500,14500#msg-14500
// 
// 1 16 0 0 0 1 0 0 0 1 0 0 0 1 empty.dat
  [1,16,0,0,0,1,0,0,0,1,0,0,0,1, ldraw_lib__empty()],
];
module ldraw_lib__1_16chrd(step=0, col=false, unit=2/5, alt=false, line=0.2, solid=!$preview)
    makepoly(ldraw_lib__1_16chrd(), step=step, col=col, unit=unit, alt=alt, line=line, solid=solid);
ldraw_lib__1_16chrd(line=0.2);
// file: s/98138s02.scad
use <../../lib.scad>
use <../../p/4-4cylo.scad>
use <../../p/4-4ring8.scad>
use <../../p/4-4ring9.scad>
use <../../p/stud4o.scad>
function ldraw_lib__s__98138s02() = [
// 0 ~Tile  1 x  1 Round with Groove without Complete Top Face
// 0 Name: s\98138s02.dat
// 0 Author: Magnus Forsberg [MagFors]
// 0 !LDRAW_ORG Subpart UPDATE 2020-01
// 0 !LICENSE Licensed under CC BY 4.0 : see CAreadme.txt
// 
// 0 BFC CERTIFY CCW
  [0,"BFC","CERTIFY"],
  [0,"BFC","CCW"],
// 
// 0 !HISTORY 2020-06-28 [PTadmin] Official Update 2020-01
// 
// 
// 1 16 0 4 0 1 0 0 0 -1 0 0 0 1 stud4o.dat
  [1,16,0,4,0,1,0,0,0,-1,0,0,0,1, ldraw_lib__stud4o()],
// 1 16 0 8 0 -1 0 0 0 -1 0 0 0 1 4-4ring8.dat
  [1,16,0,8,0,-1,0,0,0,-1,0,0,0,1, ldraw_lib__4_4ring8()],
// 1 16 0 7 0 9 0 0 0 1 0 0 0 9 4-4cylo.dat
  [1,16,0,7,0,9,0,0,0,1,0,0,0,9, ldraw_lib__4_4cylo()],
// 1 16 0 7 0 -1 0 0 0 -1 0 0 0 1 4-4ring9.dat
  [1,16,0,7,0,-1,0,0,0,-1,0,0,0,1, ldraw_lib__4_4ring9()],
// 1 16 0 0 0 10 0 0 0 7 0 0 0 10 4-4cylo.dat
  [1,16,0,0,0,10,0,0,0,7,0,0,0,10, ldraw_lib__4_4cylo()],
];
module ldraw_lib__s__98138s02(step=0, col=false, unit=2/5, alt=false, line=0.2, solid=!$preview)
    makepoly(ldraw_lib__s__98138s02(), step=step, col=col, unit=unit, alt=alt, line=line, solid=solid);
ldraw_lib__s__98138s02(line=0.2);
// file: s/98138p3fs01.scad
use <../../lib.scad>
function ldraw_lib__s__98138p3fs01() = [
// 0 ~Tile  1 x  1 Round Black Dot and Circle of Small Black Dots 1/8 Pattern
// 0 Name: s\98138p3fs01.dat
// 0 Author: Philippe Hurbain [Philo]
// 0 !LDRAW_ORG Subpart UPDATE 2026-05
// 0 !LICENSE Licensed under CC BY 4.0 : see CAreadme.txt
// 
// 0 BFC CERTIFY CCW
  [0,"BFC","CERTIFY"],
  [0,"BFC","CCW"],
// 
// 0 !HISTORY 2026-05-31 [OrionP] Official Update 2026-05
// 
// 4 0 1.14 0 -8.05 .92 0 -7.57 .51 0 -7.24 0 0 -7.12
  [4,0,1.14,0,-8.05,.92,0,-7.57,.51,0,-7.24,0,0,-7.12],
// 3 0 3.31 0 -3.31 0 0 0 0 0 -4.69
  [3,0,3.31,0,-3.31,0,0,0,0,0,-4.69],
// 4 0 .51 0 -9.38 1.14 0 -8.05 0 0 -7.12 0 0 -9.5
  [4,0,.51,0,-9.38,1.14,0,-8.05,0,0,-7.12,0,0,-9.5],
// 4 0 1.15 0 -8.59 1.14 0 -8.05 .51 0 -9.38 .93 0 -9.06
  [4,0,1.15,0,-8.59,1.14,0,-8.05,.51,0,-9.38,.93,0,-9.06],
// 4 0 3.31 0 -3.31 0 0 -4.69 1.21 0 -4.52 2.34 0 -4.06
  [4,0,3.31,0,-3.31,0,0,-4.69,1.21,0,-4.52,2.34,0,-4.06],
// 4 0 4.76 0 -5.49 6.26 0 -7 6.72 0 -6.72 5.03 0 -5.03
  [4,0,4.76,0,-5.49,6.26,0,-7,6.72,0,-6.72,5.03,0,-5.03],
// 3 0 4.76 0 -5.49 4.7 0 -6.01 4.88 0 -6.51
  [3,0,4.76,0,-5.49,4.7,0,-6.01,4.88,0,-6.51],
// 3 0 4.88 0 -6.51 5.24 0 -6.89 5.74 0 -7.05
  [3,0,4.88,0,-6.51,5.24,0,-6.89,5.74,0,-7.05],
// 4 0 4.76 0 -5.49 4.88 0 -6.51 5.74 0 -7.05 6.26 0 -7
  [4,0,4.76,0,-5.49,4.88,0,-6.51,5.74,0,-7.05,6.26,0,-7],
// 4 16 0 0 -4.69 .51 0 -7.24 .92 0 -7.57 1.21 0 -4.52
  [4,16,0,0,-4.69,.51,0,-7.24,.92,0,-7.57,1.21,0,-4.52],
// 4 16 0 0 -9.5 0 0 -10 3.827 0 -9.239 .51 0 -9.38
  [4,16,0,0,-9.5,0,0,-10,3.827,0,-9.239,.51,0,-9.38],
// 4 16 7.071 0 -7.071 6.26 0 -7 5.74 0 -7.05 3.827 0 -9.239
  [4,16,7.071,0,-7.071,6.26,0,-7,5.74,0,-7.05,3.827,0,-9.239],
// 3 16 7.071 0 -7.071 6.72 0 -6.72 6.26 0 -7
  [3,16,7.071,0,-7.071,6.72,0,-6.72,6.26,0,-7],
// 3 16 .93 0 -9.06 .51 0 -9.38 3.827 0 -9.239
  [3,16,.93,0,-9.06,.51,0,-9.38,3.827,0,-9.239],
// 3 16 3.827 0 -9.239 5.74 0 -7.05 5.24 0 -6.89
  [3,16,3.827,0,-9.239,5.74,0,-7.05,5.24,0,-6.89],
// 3 16 3.827 0 -9.239 5.24 0 -6.89 4.88 0 -6.51
  [3,16,3.827,0,-9.239,5.24,0,-6.89,4.88,0,-6.51],
// 3 16 .93 0 -9.06 3.827 0 -9.239 1.15 0 -8.59
  [3,16,.93,0,-9.06,3.827,0,-9.239,1.15,0,-8.59],
// 4 16 4.88 0 -6.51 1.14 0 -8.05 1.15 0 -8.59 3.827 0 -9.239
  [4,16,4.88,0,-6.51,1.14,0,-8.05,1.15,0,-8.59,3.827,0,-9.239],
// 4 16 4.7 0 -6.01 .92 0 -7.57 1.14 0 -8.05 4.88 0 -6.51
  [4,16,4.7,0,-6.01,.92,0,-7.57,1.14,0,-8.05,4.88,0,-6.51],
// 4 16 2.34 0 -4.06 4.76 0 -5.49 5.03 0 -5.03 3.31 0 -3.31
  [4,16,2.34,0,-4.06,4.76,0,-5.49,5.03,0,-5.03,3.31,0,-3.31],
// 4 16 4.76 0 -5.49 2.34 0 -4.06 .92 0 -7.57 4.7 0 -6.01
  [4,16,4.76,0,-5.49,2.34,0,-4.06,.92,0,-7.57,4.7,0,-6.01],
// 3 16 .92 0 -7.57 2.34 0 -4.06 1.21 0 -4.52
  [3,16,.92,0,-7.57,2.34,0,-4.06,1.21,0,-4.52],
// 3 16 0 0 -4.69 0 0 -7.12 .51 0 -7.24
  [3,16,0,0,-4.69,0,0,-7.12,.51,0,-7.24],
];
module ldraw_lib__s__98138p3fs01(step=0, col=false, unit=2/5, alt=false, line=0.2, solid=!$preview)
    makepoly(ldraw_lib__s__98138p3fs01(), step=step, col=col, unit=unit, alt=alt, line=line, solid=solid);
ldraw_lib__s__98138p3fs01(line=0.2);
// file: ../p/4-4ering.scad
use <../lib.scad>
use <1-16chrd.scad>
function ldraw_lib__4_4ering() = [
// 0 Adapter Ring Triangles to Normal 1.0
// 0 Name: 4-4ering.dat
// 0 Author: Philippe Hurbain [Philo]
// 0 !LDRAW_ORG Primitive UPDATE 2015-01
// 0 !LICENSE Licensed under CC BY 4.0 : see CAreadme.txt
// 
// 0 BFC CERTIFY CCW
  [0,"BFC","CERTIFY"],
  [0,"BFC","CCW"],
// 
// 0 !HISTORY 2015-10-11 [PTadmin] Official Update 2015-01
// 
// 
// 0 // This file uses 1-16chrd (actually empty). It allows
// 0 // tools to do primitives substition and fill in a ring of chrd here,
// 0 // or, if desired, to substitute this with the hi-res 48\1-16chrd.
// 0 // This file is based on an idea by Darats at http://forums.ldraw.org/read.php?19,14500,14500#msg-14500
// 
// 1 16 0 0 0 1 0 0 0 1 0 0 0 1 1-16chrd.dat
  [1,16,0,0,0,1,0,0,0,1,0,0,0,1, ldraw_lib__1_16chrd()],
// 1 16 0 0 0 0.92388 0 0.38268 0 1 0 -0.38268 0 0.92388 1-16chrd.dat
  [1,16,0,0,0,0.92388,0,0.38268,0,1,0,-0.38268,0,0.92388, ldraw_lib__1_16chrd()],
// 1 16 0 0 0 0.70711 0 0.70711 0 1 0 -0.70711 0 0.70711 1-16chrd.dat
  [1,16,0,0,0,0.70711,0,0.70711,0,1,0,-0.70711,0,0.70711, ldraw_lib__1_16chrd()],
// 1 16 0 0 0 0.38268 0 0.92388 0 1 0 -0.92388 0 0.38268 1-16chrd.dat
  [1,16,0,0,0,0.38268,0,0.92388,0,1,0,-0.92388,0,0.38268, ldraw_lib__1_16chrd()],
// 1 16 0 0 0 0 0 1 0 1 0 -1 0 0 1-16chrd.dat
  [1,16,0,0,0,0,0,1,0,1,0,-1,0,0, ldraw_lib__1_16chrd()],
// 1 16 0 0 0 -0.38268 0 0.92388 0 1 0 -0.92388 0 -0.38268 1-16chrd.dat
  [1,16,0,0,0,-0.38268,0,0.92388,0,1,0,-0.92388,0,-0.38268, ldraw_lib__1_16chrd()],
// 1 16 0 0 0 -0.70711 0 0.70711 0 1 0 -0.70711 0 -0.70711 1-16chrd.dat
  [1,16,0,0,0,-0.70711,0,0.70711,0,1,0,-0.70711,0,-0.70711, ldraw_lib__1_16chrd()],
// 1 16 0 0 0 -0.92388 0 0.38268 0 1 0 -0.38268 0 -0.92388 1-16chrd.dat
  [1,16,0,0,0,-0.92388,0,0.38268,0,1,0,-0.38268,0,-0.92388, ldraw_lib__1_16chrd()],
// 1 16 0 0 0 0 0 -1 0 1 0 1 0 0 1-16chrd.dat
  [1,16,0,0,0,0,0,-1,0,1,0,1,0,0, ldraw_lib__1_16chrd()],
// 1 16 0 0 0 0.38268 0 -0.92388 0 1 0 0.92388 0 0.38268 1-16chrd.dat
  [1,16,0,0,0,0.38268,0,-0.92388,0,1,0,0.92388,0,0.38268, ldraw_lib__1_16chrd()],
// 1 16 0 0 0 0.70711 0 -0.70711 0 1 0 0.70711 0 0.70711 1-16chrd.dat
  [1,16,0,0,0,0.70711,0,-0.70711,0,1,0,0.70711,0,0.70711, ldraw_lib__1_16chrd()],
// 1 16 0 0 0 0.92388 0 -0.38268 0 1 0 0.38268 0 0.92388 1-16chrd.dat
  [1,16,0,0,0,0.92388,0,-0.38268,0,1,0,0.38268,0,0.92388, ldraw_lib__1_16chrd()],
// 1 16 0 0 0 -1 0 0 0 1 0 0 0 -1 1-16chrd.dat
  [1,16,0,0,0,-1,0,0,0,1,0,0,0,-1, ldraw_lib__1_16chrd()],
// 1 16 0 0 0 -0.92388 0 -0.38268 0 1 0 0.38268 0 -0.92388 1-16chrd.dat
  [1,16,0,0,0,-0.92388,0,-0.38268,0,1,0,0.38268,0,-0.92388, ldraw_lib__1_16chrd()],
// 1 16 0 0 0 -0.70711 0 -0.70711 0 1 0 0.70711 0 -0.70711 1-16chrd.dat
  [1,16,0,0,0,-0.70711,0,-0.70711,0,1,0,0.70711,0,-0.70711, ldraw_lib__1_16chrd()],
// 1 16 0 0 0 -0.38268 0 -0.92388 0 1 0 0.92388 0 -0.38268 1-16chrd.dat
  [1,16,0,0,0,-0.38268,0,-0.92388,0,1,0,0.92388,0,-0.38268, ldraw_lib__1_16chrd()],
];
module ldraw_lib__4_4ering(step=0, col=false, unit=2/5, alt=false, line=0.2, solid=!$preview)
    makepoly(ldraw_lib__4_4ering(), step=step, col=col, unit=unit, alt=alt, line=line, solid=solid);
ldraw_lib__4_4ering(line=0.2);
// main file
use <../lib.scad>
use <../p/4-4ering.scad>
use <s/98138p3fs01.scad>
use <s/98138s02.scad>
function ldraw_lib__98138p3f() = [
// 0 Tile  1 x  1 Round with Black Dot and Circle of Small Black Dots Pattern
// 0 Name: 98138p3f.dat
// 0 Author: Philippe Hurbain [Philo]
// 0 !LDRAW_ORG Part UPDATE 2026-05
// 0 !LICENSE Licensed under CC BY 4.0 : see CAreadme.txt
// 
// 0 BFC CERTIFY CCW
  [0,"BFC","CERTIFY"],
  [0,"BFC","CCW"],
// 
// 0 !KEYWORDS Arcade Machine, Bricklink 98138pb459, Brickowl 579360
// 0 !KEYWORDS Brickset 114183, City, Connection Flange, Moon Rocket
// 0 !KEYWORDS Rebrickable 98138pr0443, Set 21367, Set 40805, Tintin, Wheel Hub
// 
// 0 !HISTORY 2026-05-31 [OrionP] Official Update 2026-05
// 
// 1 16 0 0 0 1 0 0 0 1 0 0 0 1 s\98138s02.dat
  [1,16,0,0,0,1,0,0,0,1,0,0,0,1, ldraw_lib__s__98138s02()],
// 1 16 0 0 0 10 0 0 0 1 0 0 0 10 4-4ering.dat
  [1,16,0,0,0,10,0,0,0,1,0,0,0,10, ldraw_lib__4_4ering()],
// 1 16 0 0 0 1 0 0 0 1 0 0 0 1 s\98138p3fs01.dat
  [1,16,0,0,0,1,0,0,0,1,0,0,0,1, ldraw_lib__s__98138p3fs01()],
// 1 16 0 0 0 -1 0 0 0 1 0 0 0 1 s\98138p3fs01.dat
  [1,16,0,0,0,-1,0,0,0,1,0,0,0,1, ldraw_lib__s__98138p3fs01()],
// 1 16 0 0 0 0 0 1 0 1 0 -1 0 0 s\98138p3fs01.dat
  [1,16,0,0,0,0,0,1,0,1,0,-1,0,0, ldraw_lib__s__98138p3fs01()],
// 1 16 0 0 0 0 0 1 0 1 0 1 0 0 s\98138p3fs01.dat
  [1,16,0,0,0,0,0,1,0,1,0,1,0,0, ldraw_lib__s__98138p3fs01()],
// 1 16 0 0 0 -1 0 0 0 1 0 0 0 -1 s\98138p3fs01.dat
  [1,16,0,0,0,-1,0,0,0,1,0,0,0,-1, ldraw_lib__s__98138p3fs01()],
// 1 16 0 0 0 1 0 0 0 1 0 0 0 -1 s\98138p3fs01.dat
  [1,16,0,0,0,1,0,0,0,1,0,0,0,-1, ldraw_lib__s__98138p3fs01()],
// 1 16 0 0 0 0 0 -1 0 1 0 1 0 0 s\98138p3fs01.dat
  [1,16,0,0,0,0,0,-1,0,1,0,1,0,0, ldraw_lib__s__98138p3fs01()],
// 1 16 0 0 0 0 0 -1 0 1 0 -1 0 0 s\98138p3fs01.dat
  [1,16,0,0,0,0,0,-1,0,1,0,-1,0,0, ldraw_lib__s__98138p3fs01()],
];
module ldraw_lib__98138p3f(step=0, col=false, unit=2/5, alt=false, line=0.2, solid=!$preview)
    makepoly(ldraw_lib__98138p3f(), step=step, col=col, unit=unit, alt=alt, line=line, solid=solid);
ldraw_lib__98138p3f(line=0.2);
